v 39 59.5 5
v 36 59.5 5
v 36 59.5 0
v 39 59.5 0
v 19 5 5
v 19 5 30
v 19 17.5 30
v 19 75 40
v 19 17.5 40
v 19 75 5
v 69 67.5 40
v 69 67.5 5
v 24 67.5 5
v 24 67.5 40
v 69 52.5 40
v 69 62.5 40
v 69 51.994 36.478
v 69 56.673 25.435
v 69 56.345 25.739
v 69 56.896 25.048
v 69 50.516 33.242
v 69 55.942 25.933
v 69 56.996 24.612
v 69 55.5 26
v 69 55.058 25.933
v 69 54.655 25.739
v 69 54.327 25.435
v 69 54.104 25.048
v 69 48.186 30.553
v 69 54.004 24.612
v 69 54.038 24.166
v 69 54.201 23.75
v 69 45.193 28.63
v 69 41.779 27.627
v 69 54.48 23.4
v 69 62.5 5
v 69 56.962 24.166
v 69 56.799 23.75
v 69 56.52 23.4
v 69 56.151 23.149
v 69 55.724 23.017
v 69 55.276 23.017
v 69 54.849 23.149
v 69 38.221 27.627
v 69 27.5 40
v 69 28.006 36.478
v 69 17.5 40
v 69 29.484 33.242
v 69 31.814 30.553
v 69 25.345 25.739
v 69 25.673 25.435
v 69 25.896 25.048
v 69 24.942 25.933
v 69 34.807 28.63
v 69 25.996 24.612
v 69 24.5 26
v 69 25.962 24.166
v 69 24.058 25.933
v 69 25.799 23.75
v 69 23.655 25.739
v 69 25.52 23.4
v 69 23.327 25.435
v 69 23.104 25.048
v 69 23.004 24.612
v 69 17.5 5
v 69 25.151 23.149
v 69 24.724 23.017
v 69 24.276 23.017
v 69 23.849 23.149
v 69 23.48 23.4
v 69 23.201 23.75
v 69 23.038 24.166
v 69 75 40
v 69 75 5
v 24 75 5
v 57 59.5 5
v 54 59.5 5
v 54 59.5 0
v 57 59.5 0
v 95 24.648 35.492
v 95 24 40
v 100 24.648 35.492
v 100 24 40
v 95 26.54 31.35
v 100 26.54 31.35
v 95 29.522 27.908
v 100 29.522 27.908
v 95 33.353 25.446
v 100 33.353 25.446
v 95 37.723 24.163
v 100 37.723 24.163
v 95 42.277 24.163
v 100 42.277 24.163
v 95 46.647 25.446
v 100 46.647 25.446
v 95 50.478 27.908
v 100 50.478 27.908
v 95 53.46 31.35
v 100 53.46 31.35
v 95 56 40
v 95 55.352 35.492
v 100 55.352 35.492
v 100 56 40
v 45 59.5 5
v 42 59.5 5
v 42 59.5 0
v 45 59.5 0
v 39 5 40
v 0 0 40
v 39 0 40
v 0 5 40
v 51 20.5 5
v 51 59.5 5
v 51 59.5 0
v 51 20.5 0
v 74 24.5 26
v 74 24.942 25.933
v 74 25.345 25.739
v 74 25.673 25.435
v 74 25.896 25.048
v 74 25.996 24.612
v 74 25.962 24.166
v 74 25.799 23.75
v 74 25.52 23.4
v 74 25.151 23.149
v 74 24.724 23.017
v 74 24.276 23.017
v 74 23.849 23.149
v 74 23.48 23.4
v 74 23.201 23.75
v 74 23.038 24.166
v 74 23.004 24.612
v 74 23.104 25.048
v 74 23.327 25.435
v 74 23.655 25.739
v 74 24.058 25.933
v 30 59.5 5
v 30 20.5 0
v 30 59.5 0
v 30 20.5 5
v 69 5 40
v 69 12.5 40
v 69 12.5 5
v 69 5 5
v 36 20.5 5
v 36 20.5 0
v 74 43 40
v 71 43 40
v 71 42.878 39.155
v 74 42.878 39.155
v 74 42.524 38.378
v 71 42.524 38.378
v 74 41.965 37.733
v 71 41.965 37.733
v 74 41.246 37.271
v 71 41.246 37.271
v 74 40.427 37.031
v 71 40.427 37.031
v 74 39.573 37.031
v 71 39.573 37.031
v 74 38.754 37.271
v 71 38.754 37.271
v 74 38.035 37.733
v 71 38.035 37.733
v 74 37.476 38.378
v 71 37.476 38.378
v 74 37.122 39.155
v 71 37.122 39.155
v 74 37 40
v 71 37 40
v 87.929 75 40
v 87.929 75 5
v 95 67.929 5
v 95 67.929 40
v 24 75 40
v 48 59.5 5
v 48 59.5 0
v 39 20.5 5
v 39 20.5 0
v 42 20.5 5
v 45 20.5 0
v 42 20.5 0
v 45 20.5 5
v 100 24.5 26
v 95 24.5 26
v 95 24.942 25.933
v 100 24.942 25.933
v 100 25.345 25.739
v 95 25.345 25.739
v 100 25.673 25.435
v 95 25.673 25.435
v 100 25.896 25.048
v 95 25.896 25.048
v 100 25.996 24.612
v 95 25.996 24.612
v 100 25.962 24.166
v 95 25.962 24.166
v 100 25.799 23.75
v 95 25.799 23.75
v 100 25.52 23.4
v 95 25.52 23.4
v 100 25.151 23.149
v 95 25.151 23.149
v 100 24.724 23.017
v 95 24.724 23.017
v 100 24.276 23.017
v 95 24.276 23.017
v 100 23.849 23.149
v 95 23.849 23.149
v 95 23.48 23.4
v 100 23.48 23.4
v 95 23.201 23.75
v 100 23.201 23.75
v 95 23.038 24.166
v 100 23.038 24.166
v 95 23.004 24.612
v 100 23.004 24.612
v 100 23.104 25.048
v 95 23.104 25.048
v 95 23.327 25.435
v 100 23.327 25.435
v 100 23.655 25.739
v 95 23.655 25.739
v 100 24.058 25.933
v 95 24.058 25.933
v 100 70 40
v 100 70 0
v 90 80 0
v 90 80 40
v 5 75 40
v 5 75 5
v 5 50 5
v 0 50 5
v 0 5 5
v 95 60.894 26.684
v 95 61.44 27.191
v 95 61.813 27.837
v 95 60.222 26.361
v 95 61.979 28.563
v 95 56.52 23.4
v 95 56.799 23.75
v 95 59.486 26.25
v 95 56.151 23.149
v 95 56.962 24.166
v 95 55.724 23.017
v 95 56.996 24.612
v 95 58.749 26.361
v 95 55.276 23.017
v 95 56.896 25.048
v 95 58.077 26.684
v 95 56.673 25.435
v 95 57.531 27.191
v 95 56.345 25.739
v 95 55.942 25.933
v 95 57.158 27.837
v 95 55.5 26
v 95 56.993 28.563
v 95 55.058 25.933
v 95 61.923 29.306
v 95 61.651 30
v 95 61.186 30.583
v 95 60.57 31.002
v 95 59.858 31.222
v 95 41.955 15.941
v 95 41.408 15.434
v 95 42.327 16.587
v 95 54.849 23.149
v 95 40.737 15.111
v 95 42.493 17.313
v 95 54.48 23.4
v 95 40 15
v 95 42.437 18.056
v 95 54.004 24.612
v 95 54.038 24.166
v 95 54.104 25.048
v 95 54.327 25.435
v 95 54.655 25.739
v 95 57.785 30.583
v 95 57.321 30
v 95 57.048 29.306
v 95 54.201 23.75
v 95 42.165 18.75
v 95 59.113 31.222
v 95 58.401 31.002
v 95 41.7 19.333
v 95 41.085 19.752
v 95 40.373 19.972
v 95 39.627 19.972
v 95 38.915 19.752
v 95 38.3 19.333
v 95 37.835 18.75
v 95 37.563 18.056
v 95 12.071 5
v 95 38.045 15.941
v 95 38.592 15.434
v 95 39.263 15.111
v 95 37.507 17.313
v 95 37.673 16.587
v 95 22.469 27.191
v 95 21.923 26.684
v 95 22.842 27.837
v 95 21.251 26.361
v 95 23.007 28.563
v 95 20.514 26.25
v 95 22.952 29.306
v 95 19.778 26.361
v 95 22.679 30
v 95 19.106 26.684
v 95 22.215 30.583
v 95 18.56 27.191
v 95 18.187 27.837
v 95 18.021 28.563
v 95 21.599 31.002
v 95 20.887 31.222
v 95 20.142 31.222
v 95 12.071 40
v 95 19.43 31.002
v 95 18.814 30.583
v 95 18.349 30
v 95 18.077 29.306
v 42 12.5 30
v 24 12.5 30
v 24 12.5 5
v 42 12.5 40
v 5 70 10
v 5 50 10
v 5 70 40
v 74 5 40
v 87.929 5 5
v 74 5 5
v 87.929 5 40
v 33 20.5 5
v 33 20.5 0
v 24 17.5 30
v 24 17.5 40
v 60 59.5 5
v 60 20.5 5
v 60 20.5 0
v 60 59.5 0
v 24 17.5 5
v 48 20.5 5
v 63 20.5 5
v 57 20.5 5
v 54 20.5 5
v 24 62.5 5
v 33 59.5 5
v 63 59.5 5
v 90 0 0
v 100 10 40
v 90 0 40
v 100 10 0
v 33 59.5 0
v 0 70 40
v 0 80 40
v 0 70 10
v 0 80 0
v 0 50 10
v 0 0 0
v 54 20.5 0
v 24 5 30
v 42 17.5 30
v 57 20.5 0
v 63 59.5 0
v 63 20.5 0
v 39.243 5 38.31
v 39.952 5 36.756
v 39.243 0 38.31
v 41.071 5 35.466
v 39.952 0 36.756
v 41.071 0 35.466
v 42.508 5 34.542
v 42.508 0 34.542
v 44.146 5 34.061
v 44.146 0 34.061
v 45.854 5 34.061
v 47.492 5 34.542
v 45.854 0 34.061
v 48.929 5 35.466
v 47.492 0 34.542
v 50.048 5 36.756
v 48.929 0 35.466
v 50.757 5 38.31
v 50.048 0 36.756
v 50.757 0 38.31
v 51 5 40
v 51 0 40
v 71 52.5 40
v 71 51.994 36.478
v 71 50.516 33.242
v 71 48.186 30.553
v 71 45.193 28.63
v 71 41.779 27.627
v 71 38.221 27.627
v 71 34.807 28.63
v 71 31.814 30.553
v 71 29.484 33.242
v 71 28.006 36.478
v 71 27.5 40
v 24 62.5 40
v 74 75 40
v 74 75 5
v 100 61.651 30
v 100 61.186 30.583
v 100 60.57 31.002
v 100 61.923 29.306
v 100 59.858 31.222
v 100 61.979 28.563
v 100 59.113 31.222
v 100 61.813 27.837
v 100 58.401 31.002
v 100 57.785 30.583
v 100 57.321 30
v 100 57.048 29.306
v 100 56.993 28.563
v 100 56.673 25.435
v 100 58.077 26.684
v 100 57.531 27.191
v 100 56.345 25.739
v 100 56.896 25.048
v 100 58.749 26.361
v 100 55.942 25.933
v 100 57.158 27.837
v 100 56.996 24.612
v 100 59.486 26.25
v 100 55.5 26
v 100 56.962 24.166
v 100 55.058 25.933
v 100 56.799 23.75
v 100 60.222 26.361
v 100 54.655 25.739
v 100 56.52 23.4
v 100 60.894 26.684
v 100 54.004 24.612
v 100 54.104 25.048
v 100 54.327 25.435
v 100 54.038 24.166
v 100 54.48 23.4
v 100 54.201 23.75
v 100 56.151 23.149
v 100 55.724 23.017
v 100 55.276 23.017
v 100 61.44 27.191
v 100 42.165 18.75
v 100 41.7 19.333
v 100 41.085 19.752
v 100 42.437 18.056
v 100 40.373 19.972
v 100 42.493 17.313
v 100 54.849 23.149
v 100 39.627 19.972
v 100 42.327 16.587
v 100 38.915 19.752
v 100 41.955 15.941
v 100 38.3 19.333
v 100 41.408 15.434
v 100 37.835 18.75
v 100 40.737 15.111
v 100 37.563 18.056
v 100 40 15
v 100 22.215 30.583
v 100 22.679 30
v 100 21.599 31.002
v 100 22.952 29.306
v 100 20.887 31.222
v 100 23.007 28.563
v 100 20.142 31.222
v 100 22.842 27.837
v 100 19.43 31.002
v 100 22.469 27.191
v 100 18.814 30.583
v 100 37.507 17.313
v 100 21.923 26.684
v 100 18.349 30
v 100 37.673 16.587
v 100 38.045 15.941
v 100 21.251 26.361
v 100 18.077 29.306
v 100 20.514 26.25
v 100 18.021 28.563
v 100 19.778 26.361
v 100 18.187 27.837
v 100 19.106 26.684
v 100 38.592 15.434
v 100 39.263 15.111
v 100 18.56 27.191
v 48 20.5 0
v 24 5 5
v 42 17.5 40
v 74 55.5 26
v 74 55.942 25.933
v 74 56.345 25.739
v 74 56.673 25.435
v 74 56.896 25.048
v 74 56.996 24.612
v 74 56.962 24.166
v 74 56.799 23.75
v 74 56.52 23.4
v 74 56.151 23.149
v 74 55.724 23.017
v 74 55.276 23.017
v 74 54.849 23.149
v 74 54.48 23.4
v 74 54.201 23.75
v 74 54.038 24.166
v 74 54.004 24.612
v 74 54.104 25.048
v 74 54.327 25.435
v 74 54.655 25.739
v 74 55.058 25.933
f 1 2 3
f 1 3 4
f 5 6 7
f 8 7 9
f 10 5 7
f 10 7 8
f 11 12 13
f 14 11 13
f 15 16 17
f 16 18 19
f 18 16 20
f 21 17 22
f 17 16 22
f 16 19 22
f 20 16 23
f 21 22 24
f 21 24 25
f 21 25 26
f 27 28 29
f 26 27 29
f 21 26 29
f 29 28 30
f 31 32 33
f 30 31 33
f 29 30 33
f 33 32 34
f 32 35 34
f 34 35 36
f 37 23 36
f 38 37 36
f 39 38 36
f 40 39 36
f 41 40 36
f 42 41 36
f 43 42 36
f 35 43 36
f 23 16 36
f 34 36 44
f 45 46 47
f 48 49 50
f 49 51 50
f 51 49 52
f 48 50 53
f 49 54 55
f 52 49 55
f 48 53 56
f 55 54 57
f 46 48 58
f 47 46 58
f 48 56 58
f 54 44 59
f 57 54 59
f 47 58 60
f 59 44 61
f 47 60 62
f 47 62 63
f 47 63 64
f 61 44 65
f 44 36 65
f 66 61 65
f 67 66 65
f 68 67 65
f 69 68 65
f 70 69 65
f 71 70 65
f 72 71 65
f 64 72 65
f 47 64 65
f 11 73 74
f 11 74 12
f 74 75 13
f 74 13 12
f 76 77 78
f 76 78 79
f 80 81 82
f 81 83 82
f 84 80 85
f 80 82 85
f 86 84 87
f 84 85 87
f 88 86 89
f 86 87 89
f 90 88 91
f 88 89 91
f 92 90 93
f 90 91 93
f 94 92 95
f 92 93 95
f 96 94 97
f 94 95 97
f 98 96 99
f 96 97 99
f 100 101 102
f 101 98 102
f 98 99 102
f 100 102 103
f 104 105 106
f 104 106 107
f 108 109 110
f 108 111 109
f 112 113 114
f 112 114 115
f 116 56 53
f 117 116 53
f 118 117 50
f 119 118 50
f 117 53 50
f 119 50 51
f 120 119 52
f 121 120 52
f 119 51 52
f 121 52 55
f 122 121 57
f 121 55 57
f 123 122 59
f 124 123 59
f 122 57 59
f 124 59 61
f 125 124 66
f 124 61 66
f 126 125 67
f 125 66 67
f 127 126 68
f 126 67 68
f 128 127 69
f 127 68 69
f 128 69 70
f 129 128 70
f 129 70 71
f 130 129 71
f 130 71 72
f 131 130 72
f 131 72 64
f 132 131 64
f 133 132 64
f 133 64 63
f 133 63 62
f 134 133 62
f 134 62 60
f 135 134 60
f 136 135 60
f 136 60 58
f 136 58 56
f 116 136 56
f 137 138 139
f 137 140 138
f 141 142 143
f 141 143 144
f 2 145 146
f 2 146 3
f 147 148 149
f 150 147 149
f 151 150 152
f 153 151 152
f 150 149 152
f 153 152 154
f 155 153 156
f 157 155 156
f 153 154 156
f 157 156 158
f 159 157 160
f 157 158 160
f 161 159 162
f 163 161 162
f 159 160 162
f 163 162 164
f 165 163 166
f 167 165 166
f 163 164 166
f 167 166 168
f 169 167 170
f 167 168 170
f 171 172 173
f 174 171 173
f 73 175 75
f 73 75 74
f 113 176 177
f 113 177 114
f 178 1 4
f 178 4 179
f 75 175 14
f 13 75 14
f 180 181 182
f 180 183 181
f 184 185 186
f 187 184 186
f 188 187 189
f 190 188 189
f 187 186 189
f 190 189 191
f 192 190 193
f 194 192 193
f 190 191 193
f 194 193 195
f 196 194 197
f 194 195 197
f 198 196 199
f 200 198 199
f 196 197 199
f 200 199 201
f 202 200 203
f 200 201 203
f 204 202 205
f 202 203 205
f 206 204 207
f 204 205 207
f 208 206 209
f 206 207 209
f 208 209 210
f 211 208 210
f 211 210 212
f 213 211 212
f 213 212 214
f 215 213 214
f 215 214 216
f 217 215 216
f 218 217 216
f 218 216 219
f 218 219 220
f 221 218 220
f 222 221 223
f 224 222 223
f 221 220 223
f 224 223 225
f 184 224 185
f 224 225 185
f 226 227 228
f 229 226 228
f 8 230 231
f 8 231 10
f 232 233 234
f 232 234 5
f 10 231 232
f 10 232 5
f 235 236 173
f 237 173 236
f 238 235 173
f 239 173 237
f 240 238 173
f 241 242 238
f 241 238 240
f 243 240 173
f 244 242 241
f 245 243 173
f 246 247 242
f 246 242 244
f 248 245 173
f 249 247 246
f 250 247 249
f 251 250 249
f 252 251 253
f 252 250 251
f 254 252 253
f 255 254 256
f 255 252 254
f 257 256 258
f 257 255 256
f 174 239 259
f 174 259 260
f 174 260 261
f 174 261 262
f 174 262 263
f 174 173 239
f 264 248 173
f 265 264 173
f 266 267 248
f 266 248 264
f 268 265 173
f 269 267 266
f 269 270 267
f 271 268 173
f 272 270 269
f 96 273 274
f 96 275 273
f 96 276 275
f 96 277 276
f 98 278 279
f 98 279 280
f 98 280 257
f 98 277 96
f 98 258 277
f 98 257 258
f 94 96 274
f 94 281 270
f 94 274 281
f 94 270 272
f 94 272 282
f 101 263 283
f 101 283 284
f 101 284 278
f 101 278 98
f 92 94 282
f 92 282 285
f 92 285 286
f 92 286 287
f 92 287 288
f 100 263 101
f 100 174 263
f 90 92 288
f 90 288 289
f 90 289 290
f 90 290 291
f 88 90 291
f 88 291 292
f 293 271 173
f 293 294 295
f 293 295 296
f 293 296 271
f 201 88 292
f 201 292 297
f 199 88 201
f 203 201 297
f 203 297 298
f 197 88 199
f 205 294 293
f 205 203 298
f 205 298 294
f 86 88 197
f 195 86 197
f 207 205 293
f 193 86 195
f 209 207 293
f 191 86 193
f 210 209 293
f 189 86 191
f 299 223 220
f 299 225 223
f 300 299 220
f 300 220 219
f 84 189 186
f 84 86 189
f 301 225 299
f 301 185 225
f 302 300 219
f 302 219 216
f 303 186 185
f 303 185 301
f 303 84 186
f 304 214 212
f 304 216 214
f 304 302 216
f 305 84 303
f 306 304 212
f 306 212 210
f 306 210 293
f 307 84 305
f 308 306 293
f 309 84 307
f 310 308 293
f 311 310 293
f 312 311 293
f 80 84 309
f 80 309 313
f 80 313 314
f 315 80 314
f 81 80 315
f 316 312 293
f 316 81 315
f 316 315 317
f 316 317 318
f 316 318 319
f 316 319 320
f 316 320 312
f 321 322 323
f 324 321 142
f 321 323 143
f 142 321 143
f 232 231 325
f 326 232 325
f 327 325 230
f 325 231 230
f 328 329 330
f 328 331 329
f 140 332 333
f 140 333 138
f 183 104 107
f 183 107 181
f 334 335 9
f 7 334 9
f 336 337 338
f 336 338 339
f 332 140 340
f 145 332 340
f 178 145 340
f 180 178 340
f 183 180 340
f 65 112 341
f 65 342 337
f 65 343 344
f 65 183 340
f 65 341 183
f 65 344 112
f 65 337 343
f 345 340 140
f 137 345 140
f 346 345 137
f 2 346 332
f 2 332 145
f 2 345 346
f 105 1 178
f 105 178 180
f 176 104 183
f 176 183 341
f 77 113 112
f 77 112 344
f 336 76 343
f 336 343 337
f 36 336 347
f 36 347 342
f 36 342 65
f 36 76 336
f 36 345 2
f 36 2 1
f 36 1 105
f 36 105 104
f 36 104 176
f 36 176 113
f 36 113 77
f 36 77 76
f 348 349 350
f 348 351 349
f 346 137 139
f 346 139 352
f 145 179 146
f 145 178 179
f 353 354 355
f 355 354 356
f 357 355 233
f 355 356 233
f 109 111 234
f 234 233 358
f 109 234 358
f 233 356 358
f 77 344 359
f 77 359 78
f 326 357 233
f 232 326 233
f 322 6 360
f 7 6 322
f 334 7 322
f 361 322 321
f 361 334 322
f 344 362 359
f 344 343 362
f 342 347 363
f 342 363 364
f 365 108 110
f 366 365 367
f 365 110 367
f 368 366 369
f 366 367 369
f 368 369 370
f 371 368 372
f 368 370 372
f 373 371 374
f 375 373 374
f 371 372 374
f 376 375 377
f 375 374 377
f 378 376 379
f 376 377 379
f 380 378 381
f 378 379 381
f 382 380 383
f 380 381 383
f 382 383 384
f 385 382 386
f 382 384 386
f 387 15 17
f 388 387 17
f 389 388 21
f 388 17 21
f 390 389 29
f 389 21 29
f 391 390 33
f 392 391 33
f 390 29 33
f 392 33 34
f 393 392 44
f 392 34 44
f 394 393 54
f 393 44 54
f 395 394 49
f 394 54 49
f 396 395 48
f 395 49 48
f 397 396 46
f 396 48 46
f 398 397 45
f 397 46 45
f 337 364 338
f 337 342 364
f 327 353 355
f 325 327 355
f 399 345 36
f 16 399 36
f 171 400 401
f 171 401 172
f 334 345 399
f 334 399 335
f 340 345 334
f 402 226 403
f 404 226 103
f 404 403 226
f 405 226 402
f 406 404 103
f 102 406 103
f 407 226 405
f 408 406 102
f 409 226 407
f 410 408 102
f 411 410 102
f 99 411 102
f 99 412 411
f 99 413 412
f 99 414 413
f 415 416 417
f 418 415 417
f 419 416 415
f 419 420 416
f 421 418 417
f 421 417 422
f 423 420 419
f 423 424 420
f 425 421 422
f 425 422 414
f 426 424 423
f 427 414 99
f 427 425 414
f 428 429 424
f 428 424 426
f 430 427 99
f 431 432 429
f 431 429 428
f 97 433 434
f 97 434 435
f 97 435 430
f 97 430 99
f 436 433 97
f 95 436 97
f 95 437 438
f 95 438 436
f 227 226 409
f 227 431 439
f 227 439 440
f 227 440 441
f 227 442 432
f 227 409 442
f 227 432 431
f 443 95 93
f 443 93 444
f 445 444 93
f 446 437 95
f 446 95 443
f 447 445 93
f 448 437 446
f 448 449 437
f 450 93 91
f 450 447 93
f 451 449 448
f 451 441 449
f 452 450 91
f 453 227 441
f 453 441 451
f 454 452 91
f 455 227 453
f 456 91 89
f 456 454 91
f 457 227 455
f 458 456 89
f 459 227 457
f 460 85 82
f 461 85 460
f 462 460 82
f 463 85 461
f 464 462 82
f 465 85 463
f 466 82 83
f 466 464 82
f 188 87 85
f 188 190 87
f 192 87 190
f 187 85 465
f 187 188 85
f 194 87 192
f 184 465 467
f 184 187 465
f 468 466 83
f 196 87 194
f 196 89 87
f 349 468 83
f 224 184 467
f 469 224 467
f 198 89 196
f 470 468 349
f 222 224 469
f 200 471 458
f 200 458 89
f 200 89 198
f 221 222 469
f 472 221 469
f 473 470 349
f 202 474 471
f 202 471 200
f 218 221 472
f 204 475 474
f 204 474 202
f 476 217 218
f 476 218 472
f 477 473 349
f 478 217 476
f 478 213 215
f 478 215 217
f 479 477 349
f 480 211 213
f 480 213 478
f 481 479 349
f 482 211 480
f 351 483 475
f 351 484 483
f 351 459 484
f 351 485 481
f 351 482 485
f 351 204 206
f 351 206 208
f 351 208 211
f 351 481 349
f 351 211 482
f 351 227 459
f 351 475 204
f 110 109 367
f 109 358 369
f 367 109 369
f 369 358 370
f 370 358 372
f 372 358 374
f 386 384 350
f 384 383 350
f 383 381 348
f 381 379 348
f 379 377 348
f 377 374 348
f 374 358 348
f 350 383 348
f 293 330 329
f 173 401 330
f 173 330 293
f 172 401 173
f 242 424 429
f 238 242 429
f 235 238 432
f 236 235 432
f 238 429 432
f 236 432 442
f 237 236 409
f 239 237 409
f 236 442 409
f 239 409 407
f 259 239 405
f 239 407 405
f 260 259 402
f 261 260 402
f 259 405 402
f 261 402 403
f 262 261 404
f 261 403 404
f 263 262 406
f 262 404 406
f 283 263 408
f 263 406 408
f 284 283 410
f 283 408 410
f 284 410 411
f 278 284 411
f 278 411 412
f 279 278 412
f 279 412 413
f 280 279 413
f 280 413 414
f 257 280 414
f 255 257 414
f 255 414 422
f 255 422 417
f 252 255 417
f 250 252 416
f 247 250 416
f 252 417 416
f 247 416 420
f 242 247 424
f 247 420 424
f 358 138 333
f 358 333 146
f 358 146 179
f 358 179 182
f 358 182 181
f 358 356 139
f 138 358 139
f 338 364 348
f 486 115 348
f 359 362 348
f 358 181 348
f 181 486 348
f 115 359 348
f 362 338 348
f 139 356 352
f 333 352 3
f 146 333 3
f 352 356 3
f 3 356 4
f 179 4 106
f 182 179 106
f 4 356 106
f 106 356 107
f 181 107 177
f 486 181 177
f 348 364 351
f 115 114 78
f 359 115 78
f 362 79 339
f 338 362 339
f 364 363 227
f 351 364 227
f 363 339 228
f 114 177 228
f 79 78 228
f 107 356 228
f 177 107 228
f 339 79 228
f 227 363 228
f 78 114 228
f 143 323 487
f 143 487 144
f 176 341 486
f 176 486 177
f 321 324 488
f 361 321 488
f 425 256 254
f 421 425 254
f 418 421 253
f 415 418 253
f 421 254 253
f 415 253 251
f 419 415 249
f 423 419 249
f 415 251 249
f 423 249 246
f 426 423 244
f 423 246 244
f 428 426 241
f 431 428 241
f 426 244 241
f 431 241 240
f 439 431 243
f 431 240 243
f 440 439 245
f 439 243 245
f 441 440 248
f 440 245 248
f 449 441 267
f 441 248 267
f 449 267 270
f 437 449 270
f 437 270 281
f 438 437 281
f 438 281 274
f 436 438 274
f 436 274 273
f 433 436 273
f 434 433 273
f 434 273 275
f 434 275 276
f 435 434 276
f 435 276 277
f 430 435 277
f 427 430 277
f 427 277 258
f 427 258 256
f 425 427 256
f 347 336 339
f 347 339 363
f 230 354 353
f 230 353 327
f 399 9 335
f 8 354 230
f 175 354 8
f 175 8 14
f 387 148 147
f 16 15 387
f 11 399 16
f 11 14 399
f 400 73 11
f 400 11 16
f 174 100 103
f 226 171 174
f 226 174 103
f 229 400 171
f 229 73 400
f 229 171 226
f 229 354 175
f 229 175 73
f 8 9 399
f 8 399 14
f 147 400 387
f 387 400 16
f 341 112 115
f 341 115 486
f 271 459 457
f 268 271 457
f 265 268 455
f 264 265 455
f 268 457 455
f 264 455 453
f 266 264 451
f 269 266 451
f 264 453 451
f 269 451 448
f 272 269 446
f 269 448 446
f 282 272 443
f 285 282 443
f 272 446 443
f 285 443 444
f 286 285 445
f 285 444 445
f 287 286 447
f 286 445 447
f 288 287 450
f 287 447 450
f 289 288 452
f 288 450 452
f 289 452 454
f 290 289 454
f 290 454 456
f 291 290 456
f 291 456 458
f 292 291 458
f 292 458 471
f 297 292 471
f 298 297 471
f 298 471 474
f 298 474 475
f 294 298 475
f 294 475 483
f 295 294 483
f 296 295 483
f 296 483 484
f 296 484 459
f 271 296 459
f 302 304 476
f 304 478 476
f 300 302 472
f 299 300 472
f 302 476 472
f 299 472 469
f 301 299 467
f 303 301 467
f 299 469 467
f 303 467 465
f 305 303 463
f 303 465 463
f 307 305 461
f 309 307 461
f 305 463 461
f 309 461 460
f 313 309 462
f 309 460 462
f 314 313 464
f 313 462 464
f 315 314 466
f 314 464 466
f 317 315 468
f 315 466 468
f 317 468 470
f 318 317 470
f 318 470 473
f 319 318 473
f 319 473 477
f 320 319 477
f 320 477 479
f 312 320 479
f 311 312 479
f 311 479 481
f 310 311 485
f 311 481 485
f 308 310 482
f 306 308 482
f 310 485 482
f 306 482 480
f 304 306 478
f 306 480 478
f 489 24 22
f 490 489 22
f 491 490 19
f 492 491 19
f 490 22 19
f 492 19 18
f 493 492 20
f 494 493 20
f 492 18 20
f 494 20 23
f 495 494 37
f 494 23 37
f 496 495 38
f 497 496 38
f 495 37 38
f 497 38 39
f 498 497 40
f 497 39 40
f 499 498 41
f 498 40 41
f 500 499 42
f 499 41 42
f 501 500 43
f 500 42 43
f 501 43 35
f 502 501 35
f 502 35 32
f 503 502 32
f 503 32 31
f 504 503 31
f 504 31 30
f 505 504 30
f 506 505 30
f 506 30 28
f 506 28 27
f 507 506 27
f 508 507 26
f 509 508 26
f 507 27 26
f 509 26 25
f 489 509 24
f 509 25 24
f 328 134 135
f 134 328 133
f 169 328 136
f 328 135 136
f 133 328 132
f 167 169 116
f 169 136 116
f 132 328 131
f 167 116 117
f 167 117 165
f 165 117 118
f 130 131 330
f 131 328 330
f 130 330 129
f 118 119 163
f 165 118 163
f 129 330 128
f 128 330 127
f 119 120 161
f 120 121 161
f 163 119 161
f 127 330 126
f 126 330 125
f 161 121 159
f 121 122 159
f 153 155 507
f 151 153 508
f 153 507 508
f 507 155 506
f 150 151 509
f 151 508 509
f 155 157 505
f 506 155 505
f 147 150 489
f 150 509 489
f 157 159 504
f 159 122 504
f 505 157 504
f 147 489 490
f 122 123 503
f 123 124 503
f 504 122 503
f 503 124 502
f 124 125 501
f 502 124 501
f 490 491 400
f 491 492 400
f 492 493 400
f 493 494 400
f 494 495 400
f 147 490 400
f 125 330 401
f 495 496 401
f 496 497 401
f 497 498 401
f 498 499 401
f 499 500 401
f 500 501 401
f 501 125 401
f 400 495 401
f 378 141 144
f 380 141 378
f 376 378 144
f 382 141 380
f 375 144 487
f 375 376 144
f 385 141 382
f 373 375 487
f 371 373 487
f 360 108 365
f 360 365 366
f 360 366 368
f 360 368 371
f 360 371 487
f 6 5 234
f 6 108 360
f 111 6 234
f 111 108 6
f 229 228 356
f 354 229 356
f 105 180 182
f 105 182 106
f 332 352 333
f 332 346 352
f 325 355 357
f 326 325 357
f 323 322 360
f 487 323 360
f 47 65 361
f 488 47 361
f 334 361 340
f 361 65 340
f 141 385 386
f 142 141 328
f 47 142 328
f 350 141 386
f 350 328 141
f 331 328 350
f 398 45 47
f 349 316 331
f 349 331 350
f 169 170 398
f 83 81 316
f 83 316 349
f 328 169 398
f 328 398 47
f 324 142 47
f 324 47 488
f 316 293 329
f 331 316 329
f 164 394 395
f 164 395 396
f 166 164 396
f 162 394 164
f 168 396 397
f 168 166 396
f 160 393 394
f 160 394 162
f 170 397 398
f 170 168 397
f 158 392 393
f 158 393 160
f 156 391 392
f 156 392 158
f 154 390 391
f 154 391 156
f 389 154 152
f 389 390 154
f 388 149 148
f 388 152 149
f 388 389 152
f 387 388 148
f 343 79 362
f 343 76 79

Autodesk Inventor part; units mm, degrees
ref_plane "YZ Plane" through (0, 0, 0) normal (1, 0, 0) x (0, 1, 0)
ref_plane "XZ Plane" through (0, 0, 0) normal (0, 1, 0) x (-1, 0, 0)
ref_plane "XY Plane" through (0, 0, 0) normal (0, 0, 1) x (1, 0, 0)
sketch "Sketch1" plane through (0, 0, 0) normal (0, 0, 1) x (1, 0, 0)
  line L0 (0, 0) -> (100, 0)
  line L1 (100, 0) -> (100, 80) construction
  line L2 (100, 80) -> (0, 80)
  line L3 (0, 80) -> (0, 0)
  line L4 (100, 70) -> (90, 80)
  line L5 (100, 10) -> (90, 0)
  line L6 (100, 70) -> (100, 10)
  line L7 (90, 0) -> (0, 0)
  line L8 (90, 80) -> (0, 80)
  dimension "d0" = 100
  dimension "d1" = 80
  dimension "d15" = 10
  dimension "d16" = 10
  dimension "d17" = 10
  dimension "d18" = 10
extrude "Extrusion1" add sketch "Sketch1" along normal blind 40
sketch "Sketch2" plane through (0, 0, 40) normal (0, 0, 1) x (1, 0, 0)
  line L0 (90, 80) -> (0, 80) projected
  line L1 (100, 70) -> (90, 80) projected
  line L2 (100, 10) -> (100, 70) projected
  line L3 (90, 0) -> (100, 10) projected
  line L4 (0, 0) -> (90, 0) projected
  line L5 (0, 75) -> (87.9289, 75)
  line L6 (87.9289, 75) -> (95, 67.9289)
  line L7 (95, 67.9289) -> (95, 12.0711)
  line L8 (95, 12.0711) -> (87.9289, 5)
  line L9 (87.9289, 5) -> (0, 5)
  line L10 (0, 80) -> (0, 0) projected
  line L11 (0, 75) -> (0, 5)
  dimension "d19" = 5
extrude "Extrusion2" cut sketch "Sketch2" against normal blind 35 contours L5 L6 L7 L8 L9 L10
sketch "Sketch3" plane through (0, 0, 0) normal (-1, 0, 0) x (0, 0, 1)
  line L0 (0, 80) -> (40, 80)
  line L1 (0, 0) -> (40, 0)
  line L2 (0, 80) -> (10, 80)
  line L3 (10, 80) -> (10, 50)
  line L4 (10, 50) -> (0, 50)
  line L5 (0, 50) -> (0, 80)
  line L6 (40, 80) -> (40, 0)
  line L7 (0, 80) -> (40, 80)
  line L8 (40, 80) -> (40, 70)
  line L9 (40, 70) -> (0, 70)
  line L10 (0, 70) -> (0, 80)
  line L11 (0, 0) -> (40, 0) projected
  line L12 (0, 80) -> (40, 80) projected
  point P0 (20, 0)
  point P1 (20, 80)
  dimension "d7" = 10
  dimension "d8" = 10
  dimension "d11" = 50
extrude "Extrusion3" add sketch "Sketch3" against normal blind 5
sketch "Sketch4" plane through (100, 10, 0) normal (1, 0, 0) x (0, 0, -1)
  circle A0 centre (-40, 30) radius 16
  line L0 (-40, 0) -> (-40, 60) projected
  point P0 (66.6667, -50)
  dimension "d12" = 32
extrude "Extrusion4" cut sketch "Sketch4" against normal through all
sketch "Sketch5" plane through (0, 0, 5) normal (0, 0, 1) x (1, 0, 0)
  line L0 (74, 75) -> (69, 75)
  line L1 (69, 75) -> (69, 5)
  line L2 (69, 5) -> (74, 5)
  line L3 (74, 5) -> (74, 75)
  line L4 (87.9289, 5) -> (0, 5) projected
  line L5 (5, 75) -> (87.9289, 75) projected
  line L6 (95, 67.9289) -> (95, 56) projected
  point P0 (0, 0)
  dimension "d20" = 5
  dimension "d21" = 21
extrude "Extrusion5" add sketch "Sketch5" along normal blind 35
sketch "Sketch6" plane through (69, 5, 5) normal (-1, 0, 0) x (0, 0, 1)
  line L0 (35, 70) -> (35, 0) projected
  circle A0 centre (35, 35) radius 3
  line L1 (19.5, 19.5) -> (50.5, 19.5) construction
  line L2 (50.5, 19.5) -> (50.5, 50.5) construction
  line L3 (50.5, 50.5) -> (19.5, 50.5) construction
  line L4 (19.5, 50.5) -> (19.5, 19.5) construction
  line L5 (19.5, 19.5) -> (50.5, 50.5) construction
  line L6 (50.5, 19.5) -> (19.5, 50.5) construction
  circle A1 centre (19.5, 50.5) radius 1.5
  circle A2 centre (19.5, 19.5) radius 1.5
  point P0 (-5, -5)
  dimension "d24" = 6
  dimension "d25" = 31
  dimension "d26" = 31
  dimension "d27" = 3
  dimension "d28" = 3
extrude "Extrusion6" cut sketch "Sketch6" against normal through all
sketch "Sketch7" plane through (69, 5, 5) normal (-1, 0, 0) x (0, 0, 1)
  arc A0 (35, 38) -> (35, 32) centre (35, 35) ccw projected
  circle A1 centre (35, 35) radius 12.5
  point P0 (-5, -5)
  dimension "d31" = 25
extrude "Extrusion7" cut sketch "Sketch7" against normal blind 2
sketch "Sketch8" plane through (0, 0, 5) normal (0, 0, 1) x (1, 0, 0)
  line L0 (69, 17.5) -> (19, 17.5)
  line L1 (19, 17.5) -> (19, 12.5)
  line L2 (19, 12.5) -> (69, 12.5)
  line L3 (69, 12.5) -> (69, 17.5)
  line L4 (69, 27.5) -> (69, 5) projected
  line L5 (69, 67.5) -> (19, 67.5)
  line L6 (19, 67.5) -> (19, 62.5)
  line L7 (19, 62.5) -> (69, 62.5)
  line L8 (69, 62.5) -> (69, 67.5)
  line L9 (19, 62.5) -> (19, 17.5) construction
  line L10 (69, 27.5) -> (69, 52.5) construction
  point P0 (0, 0)
  point P1 (69, 15)
  point P2 (19, 40)
  point P3 (69, 40)
  dimension "d34" = 50
  dimension "d35" = 5
  dimension "d36" = 50
  dimension "d37" = 5
  dimension "d38" = 45
extrude "Extrusion8" add sketch "Sketch8" along normal blind 35
sketch "Sketch9" plane through (0, 0, 5) normal (0, 0, 1) x (1, 0, 0)
  line L0 (19, 75) -> (24, 75)
  line L1 (24, 75) -> (24, 5)
  line L2 (24, 5) -> (19, 5)
  line L3 (19, 5) -> (19, 75)
  line L4 (5, 75) -> (69, 75) projected
  line L5 (69, 5) -> (0, 5) projected
  point P0 (0, 0)
  point P1 (19, 12.5)
  dimension "d41" = 5
extrude "Extrusion9" add sketch "Sketch9" along normal blind 35
sketch "Sketch10" plane through (0, 0, 40) normal (0, 0, 1) x (1, 0, 0)
  line L0 (24, 17.5) -> (69, 17.5) projected
  line L1 (19, 5) -> (19, 75) projected
  line L2 (42, 17.5) -> (19, 17.5)
  line L3 (19, 17.5) -> (19, 5)
  line L4 (19, 5) -> (42, 5)
  line L5 (42, 5) -> (42, 17.5)
  point P0 (0, 0)
  dimension "d44" = 23
extrude "Extrusion10" cut sketch "Sketch10" against normal blind 10
sketch "Sketch11" plane through (0, 0, 5) normal (0, 0, 1) x (1, 0, 0)
  line L0 (30, 59.5) -> (33, 59.5)
  line L1 (33, 59.5) -> (33, 20.5)
  line L2 (33, 20.5) -> (30, 20.5)
  line L3 (30, 20.5) -> (30, 59.5)
  line L4 (24, 62.5) -> (69, 62.5) projected
  line L5 (24, 17.5) -> (42, 17.5) projected
  line L6 (24, 17.5) -> (24, 62.5) projected
  line L7 (36, 59.5) -> (39, 59.5)
  line L8 (39, 59.5) -> (39, 20.5)
  line L9 (39, 20.5) -> (36, 20.5)
  line L10 (36, 20.5) -> (36, 59.5)
  line L11 (42, 59.5) -> (45, 59.5)
  line L12 (45, 59.5) -> (45, 20.5)
  line L13 (45, 20.5) -> (42, 20.5)
  line L14 (42, 20.5) -> (42, 59.5)
  line L15 (48, 59.5) -> (51, 59.5)
  line L16 (51, 59.5) -> (51, 20.5)
  line L17 (51, 20.5) -> (48, 20.5)
  line L18 (48, 20.5) -> (48, 59.5)
  line L19 (54, 59.5) -> (57, 59.5)
  line L20 (57, 59.5) -> (57, 20.5)
  line L21 (57, 20.5) -> (54, 20.5)
  line L22 (54, 20.5) -> (54, 59.5)
  line L23 (60, 59.5) -> (63, 59.5)
  line L24 (63, 59.5) -> (63, 20.5)
  line L25 (63, 20.5) -> (60, 20.5)
  line L26 (60, 20.5) -> (60, 59.5)
  point P0 (0, 0)
  dimension "d47" = 3
  dimension "d48" = 3
  dimension "d49" = 3
  dimension "d50" = 6
  dimension "d53" = 6
extrude "Extrusion11" cut sketch "Sketch11" against normal through all
sketch "Sketch12" plane through (0, 0, 0) normal (0, -1, 0) x (1, 0, 0)
  circle A0 centre (45, 40) radius 6
  line L0 (0, 40) -> (90, 40) projected
  point P0 (0, 0)
  dimension "d60" = 12
extrude "Extrusion12" cut sketch "Sketch12" against normal blind 5
sketch "Sketch13" plane through (100, 10, 0) normal (1, 0, 0) x (0, 0, -1)
  circle A0 centre (-17.5, 30) radius 2.5
  arc A1 (-40, 14) -> (-40, 46) centre (-40, 30) ccw projected
  circle A2 centre (-28.75, 49.4856) radius 2.5
  circle A3 centre (-51.25, 49.4856) radius 2.5
  circle A4 centre (-62.5, 30) radius 2.5
  circle A5 centre (-51.25, 10.5144) radius 2.5
  circle A6 centre (-28.75, 10.5144) radius 2.5
  point P0 (0, -10)
  dimension "d63" = 5
  dimension "d64" = 22.5
  dimension "d67" = 360
extrude "Extrusion13" cut sketch "Sketch13" against normal blind 10 contours A0 | A2 | A6
properties part number "FA001" material "ABS Plastic"
